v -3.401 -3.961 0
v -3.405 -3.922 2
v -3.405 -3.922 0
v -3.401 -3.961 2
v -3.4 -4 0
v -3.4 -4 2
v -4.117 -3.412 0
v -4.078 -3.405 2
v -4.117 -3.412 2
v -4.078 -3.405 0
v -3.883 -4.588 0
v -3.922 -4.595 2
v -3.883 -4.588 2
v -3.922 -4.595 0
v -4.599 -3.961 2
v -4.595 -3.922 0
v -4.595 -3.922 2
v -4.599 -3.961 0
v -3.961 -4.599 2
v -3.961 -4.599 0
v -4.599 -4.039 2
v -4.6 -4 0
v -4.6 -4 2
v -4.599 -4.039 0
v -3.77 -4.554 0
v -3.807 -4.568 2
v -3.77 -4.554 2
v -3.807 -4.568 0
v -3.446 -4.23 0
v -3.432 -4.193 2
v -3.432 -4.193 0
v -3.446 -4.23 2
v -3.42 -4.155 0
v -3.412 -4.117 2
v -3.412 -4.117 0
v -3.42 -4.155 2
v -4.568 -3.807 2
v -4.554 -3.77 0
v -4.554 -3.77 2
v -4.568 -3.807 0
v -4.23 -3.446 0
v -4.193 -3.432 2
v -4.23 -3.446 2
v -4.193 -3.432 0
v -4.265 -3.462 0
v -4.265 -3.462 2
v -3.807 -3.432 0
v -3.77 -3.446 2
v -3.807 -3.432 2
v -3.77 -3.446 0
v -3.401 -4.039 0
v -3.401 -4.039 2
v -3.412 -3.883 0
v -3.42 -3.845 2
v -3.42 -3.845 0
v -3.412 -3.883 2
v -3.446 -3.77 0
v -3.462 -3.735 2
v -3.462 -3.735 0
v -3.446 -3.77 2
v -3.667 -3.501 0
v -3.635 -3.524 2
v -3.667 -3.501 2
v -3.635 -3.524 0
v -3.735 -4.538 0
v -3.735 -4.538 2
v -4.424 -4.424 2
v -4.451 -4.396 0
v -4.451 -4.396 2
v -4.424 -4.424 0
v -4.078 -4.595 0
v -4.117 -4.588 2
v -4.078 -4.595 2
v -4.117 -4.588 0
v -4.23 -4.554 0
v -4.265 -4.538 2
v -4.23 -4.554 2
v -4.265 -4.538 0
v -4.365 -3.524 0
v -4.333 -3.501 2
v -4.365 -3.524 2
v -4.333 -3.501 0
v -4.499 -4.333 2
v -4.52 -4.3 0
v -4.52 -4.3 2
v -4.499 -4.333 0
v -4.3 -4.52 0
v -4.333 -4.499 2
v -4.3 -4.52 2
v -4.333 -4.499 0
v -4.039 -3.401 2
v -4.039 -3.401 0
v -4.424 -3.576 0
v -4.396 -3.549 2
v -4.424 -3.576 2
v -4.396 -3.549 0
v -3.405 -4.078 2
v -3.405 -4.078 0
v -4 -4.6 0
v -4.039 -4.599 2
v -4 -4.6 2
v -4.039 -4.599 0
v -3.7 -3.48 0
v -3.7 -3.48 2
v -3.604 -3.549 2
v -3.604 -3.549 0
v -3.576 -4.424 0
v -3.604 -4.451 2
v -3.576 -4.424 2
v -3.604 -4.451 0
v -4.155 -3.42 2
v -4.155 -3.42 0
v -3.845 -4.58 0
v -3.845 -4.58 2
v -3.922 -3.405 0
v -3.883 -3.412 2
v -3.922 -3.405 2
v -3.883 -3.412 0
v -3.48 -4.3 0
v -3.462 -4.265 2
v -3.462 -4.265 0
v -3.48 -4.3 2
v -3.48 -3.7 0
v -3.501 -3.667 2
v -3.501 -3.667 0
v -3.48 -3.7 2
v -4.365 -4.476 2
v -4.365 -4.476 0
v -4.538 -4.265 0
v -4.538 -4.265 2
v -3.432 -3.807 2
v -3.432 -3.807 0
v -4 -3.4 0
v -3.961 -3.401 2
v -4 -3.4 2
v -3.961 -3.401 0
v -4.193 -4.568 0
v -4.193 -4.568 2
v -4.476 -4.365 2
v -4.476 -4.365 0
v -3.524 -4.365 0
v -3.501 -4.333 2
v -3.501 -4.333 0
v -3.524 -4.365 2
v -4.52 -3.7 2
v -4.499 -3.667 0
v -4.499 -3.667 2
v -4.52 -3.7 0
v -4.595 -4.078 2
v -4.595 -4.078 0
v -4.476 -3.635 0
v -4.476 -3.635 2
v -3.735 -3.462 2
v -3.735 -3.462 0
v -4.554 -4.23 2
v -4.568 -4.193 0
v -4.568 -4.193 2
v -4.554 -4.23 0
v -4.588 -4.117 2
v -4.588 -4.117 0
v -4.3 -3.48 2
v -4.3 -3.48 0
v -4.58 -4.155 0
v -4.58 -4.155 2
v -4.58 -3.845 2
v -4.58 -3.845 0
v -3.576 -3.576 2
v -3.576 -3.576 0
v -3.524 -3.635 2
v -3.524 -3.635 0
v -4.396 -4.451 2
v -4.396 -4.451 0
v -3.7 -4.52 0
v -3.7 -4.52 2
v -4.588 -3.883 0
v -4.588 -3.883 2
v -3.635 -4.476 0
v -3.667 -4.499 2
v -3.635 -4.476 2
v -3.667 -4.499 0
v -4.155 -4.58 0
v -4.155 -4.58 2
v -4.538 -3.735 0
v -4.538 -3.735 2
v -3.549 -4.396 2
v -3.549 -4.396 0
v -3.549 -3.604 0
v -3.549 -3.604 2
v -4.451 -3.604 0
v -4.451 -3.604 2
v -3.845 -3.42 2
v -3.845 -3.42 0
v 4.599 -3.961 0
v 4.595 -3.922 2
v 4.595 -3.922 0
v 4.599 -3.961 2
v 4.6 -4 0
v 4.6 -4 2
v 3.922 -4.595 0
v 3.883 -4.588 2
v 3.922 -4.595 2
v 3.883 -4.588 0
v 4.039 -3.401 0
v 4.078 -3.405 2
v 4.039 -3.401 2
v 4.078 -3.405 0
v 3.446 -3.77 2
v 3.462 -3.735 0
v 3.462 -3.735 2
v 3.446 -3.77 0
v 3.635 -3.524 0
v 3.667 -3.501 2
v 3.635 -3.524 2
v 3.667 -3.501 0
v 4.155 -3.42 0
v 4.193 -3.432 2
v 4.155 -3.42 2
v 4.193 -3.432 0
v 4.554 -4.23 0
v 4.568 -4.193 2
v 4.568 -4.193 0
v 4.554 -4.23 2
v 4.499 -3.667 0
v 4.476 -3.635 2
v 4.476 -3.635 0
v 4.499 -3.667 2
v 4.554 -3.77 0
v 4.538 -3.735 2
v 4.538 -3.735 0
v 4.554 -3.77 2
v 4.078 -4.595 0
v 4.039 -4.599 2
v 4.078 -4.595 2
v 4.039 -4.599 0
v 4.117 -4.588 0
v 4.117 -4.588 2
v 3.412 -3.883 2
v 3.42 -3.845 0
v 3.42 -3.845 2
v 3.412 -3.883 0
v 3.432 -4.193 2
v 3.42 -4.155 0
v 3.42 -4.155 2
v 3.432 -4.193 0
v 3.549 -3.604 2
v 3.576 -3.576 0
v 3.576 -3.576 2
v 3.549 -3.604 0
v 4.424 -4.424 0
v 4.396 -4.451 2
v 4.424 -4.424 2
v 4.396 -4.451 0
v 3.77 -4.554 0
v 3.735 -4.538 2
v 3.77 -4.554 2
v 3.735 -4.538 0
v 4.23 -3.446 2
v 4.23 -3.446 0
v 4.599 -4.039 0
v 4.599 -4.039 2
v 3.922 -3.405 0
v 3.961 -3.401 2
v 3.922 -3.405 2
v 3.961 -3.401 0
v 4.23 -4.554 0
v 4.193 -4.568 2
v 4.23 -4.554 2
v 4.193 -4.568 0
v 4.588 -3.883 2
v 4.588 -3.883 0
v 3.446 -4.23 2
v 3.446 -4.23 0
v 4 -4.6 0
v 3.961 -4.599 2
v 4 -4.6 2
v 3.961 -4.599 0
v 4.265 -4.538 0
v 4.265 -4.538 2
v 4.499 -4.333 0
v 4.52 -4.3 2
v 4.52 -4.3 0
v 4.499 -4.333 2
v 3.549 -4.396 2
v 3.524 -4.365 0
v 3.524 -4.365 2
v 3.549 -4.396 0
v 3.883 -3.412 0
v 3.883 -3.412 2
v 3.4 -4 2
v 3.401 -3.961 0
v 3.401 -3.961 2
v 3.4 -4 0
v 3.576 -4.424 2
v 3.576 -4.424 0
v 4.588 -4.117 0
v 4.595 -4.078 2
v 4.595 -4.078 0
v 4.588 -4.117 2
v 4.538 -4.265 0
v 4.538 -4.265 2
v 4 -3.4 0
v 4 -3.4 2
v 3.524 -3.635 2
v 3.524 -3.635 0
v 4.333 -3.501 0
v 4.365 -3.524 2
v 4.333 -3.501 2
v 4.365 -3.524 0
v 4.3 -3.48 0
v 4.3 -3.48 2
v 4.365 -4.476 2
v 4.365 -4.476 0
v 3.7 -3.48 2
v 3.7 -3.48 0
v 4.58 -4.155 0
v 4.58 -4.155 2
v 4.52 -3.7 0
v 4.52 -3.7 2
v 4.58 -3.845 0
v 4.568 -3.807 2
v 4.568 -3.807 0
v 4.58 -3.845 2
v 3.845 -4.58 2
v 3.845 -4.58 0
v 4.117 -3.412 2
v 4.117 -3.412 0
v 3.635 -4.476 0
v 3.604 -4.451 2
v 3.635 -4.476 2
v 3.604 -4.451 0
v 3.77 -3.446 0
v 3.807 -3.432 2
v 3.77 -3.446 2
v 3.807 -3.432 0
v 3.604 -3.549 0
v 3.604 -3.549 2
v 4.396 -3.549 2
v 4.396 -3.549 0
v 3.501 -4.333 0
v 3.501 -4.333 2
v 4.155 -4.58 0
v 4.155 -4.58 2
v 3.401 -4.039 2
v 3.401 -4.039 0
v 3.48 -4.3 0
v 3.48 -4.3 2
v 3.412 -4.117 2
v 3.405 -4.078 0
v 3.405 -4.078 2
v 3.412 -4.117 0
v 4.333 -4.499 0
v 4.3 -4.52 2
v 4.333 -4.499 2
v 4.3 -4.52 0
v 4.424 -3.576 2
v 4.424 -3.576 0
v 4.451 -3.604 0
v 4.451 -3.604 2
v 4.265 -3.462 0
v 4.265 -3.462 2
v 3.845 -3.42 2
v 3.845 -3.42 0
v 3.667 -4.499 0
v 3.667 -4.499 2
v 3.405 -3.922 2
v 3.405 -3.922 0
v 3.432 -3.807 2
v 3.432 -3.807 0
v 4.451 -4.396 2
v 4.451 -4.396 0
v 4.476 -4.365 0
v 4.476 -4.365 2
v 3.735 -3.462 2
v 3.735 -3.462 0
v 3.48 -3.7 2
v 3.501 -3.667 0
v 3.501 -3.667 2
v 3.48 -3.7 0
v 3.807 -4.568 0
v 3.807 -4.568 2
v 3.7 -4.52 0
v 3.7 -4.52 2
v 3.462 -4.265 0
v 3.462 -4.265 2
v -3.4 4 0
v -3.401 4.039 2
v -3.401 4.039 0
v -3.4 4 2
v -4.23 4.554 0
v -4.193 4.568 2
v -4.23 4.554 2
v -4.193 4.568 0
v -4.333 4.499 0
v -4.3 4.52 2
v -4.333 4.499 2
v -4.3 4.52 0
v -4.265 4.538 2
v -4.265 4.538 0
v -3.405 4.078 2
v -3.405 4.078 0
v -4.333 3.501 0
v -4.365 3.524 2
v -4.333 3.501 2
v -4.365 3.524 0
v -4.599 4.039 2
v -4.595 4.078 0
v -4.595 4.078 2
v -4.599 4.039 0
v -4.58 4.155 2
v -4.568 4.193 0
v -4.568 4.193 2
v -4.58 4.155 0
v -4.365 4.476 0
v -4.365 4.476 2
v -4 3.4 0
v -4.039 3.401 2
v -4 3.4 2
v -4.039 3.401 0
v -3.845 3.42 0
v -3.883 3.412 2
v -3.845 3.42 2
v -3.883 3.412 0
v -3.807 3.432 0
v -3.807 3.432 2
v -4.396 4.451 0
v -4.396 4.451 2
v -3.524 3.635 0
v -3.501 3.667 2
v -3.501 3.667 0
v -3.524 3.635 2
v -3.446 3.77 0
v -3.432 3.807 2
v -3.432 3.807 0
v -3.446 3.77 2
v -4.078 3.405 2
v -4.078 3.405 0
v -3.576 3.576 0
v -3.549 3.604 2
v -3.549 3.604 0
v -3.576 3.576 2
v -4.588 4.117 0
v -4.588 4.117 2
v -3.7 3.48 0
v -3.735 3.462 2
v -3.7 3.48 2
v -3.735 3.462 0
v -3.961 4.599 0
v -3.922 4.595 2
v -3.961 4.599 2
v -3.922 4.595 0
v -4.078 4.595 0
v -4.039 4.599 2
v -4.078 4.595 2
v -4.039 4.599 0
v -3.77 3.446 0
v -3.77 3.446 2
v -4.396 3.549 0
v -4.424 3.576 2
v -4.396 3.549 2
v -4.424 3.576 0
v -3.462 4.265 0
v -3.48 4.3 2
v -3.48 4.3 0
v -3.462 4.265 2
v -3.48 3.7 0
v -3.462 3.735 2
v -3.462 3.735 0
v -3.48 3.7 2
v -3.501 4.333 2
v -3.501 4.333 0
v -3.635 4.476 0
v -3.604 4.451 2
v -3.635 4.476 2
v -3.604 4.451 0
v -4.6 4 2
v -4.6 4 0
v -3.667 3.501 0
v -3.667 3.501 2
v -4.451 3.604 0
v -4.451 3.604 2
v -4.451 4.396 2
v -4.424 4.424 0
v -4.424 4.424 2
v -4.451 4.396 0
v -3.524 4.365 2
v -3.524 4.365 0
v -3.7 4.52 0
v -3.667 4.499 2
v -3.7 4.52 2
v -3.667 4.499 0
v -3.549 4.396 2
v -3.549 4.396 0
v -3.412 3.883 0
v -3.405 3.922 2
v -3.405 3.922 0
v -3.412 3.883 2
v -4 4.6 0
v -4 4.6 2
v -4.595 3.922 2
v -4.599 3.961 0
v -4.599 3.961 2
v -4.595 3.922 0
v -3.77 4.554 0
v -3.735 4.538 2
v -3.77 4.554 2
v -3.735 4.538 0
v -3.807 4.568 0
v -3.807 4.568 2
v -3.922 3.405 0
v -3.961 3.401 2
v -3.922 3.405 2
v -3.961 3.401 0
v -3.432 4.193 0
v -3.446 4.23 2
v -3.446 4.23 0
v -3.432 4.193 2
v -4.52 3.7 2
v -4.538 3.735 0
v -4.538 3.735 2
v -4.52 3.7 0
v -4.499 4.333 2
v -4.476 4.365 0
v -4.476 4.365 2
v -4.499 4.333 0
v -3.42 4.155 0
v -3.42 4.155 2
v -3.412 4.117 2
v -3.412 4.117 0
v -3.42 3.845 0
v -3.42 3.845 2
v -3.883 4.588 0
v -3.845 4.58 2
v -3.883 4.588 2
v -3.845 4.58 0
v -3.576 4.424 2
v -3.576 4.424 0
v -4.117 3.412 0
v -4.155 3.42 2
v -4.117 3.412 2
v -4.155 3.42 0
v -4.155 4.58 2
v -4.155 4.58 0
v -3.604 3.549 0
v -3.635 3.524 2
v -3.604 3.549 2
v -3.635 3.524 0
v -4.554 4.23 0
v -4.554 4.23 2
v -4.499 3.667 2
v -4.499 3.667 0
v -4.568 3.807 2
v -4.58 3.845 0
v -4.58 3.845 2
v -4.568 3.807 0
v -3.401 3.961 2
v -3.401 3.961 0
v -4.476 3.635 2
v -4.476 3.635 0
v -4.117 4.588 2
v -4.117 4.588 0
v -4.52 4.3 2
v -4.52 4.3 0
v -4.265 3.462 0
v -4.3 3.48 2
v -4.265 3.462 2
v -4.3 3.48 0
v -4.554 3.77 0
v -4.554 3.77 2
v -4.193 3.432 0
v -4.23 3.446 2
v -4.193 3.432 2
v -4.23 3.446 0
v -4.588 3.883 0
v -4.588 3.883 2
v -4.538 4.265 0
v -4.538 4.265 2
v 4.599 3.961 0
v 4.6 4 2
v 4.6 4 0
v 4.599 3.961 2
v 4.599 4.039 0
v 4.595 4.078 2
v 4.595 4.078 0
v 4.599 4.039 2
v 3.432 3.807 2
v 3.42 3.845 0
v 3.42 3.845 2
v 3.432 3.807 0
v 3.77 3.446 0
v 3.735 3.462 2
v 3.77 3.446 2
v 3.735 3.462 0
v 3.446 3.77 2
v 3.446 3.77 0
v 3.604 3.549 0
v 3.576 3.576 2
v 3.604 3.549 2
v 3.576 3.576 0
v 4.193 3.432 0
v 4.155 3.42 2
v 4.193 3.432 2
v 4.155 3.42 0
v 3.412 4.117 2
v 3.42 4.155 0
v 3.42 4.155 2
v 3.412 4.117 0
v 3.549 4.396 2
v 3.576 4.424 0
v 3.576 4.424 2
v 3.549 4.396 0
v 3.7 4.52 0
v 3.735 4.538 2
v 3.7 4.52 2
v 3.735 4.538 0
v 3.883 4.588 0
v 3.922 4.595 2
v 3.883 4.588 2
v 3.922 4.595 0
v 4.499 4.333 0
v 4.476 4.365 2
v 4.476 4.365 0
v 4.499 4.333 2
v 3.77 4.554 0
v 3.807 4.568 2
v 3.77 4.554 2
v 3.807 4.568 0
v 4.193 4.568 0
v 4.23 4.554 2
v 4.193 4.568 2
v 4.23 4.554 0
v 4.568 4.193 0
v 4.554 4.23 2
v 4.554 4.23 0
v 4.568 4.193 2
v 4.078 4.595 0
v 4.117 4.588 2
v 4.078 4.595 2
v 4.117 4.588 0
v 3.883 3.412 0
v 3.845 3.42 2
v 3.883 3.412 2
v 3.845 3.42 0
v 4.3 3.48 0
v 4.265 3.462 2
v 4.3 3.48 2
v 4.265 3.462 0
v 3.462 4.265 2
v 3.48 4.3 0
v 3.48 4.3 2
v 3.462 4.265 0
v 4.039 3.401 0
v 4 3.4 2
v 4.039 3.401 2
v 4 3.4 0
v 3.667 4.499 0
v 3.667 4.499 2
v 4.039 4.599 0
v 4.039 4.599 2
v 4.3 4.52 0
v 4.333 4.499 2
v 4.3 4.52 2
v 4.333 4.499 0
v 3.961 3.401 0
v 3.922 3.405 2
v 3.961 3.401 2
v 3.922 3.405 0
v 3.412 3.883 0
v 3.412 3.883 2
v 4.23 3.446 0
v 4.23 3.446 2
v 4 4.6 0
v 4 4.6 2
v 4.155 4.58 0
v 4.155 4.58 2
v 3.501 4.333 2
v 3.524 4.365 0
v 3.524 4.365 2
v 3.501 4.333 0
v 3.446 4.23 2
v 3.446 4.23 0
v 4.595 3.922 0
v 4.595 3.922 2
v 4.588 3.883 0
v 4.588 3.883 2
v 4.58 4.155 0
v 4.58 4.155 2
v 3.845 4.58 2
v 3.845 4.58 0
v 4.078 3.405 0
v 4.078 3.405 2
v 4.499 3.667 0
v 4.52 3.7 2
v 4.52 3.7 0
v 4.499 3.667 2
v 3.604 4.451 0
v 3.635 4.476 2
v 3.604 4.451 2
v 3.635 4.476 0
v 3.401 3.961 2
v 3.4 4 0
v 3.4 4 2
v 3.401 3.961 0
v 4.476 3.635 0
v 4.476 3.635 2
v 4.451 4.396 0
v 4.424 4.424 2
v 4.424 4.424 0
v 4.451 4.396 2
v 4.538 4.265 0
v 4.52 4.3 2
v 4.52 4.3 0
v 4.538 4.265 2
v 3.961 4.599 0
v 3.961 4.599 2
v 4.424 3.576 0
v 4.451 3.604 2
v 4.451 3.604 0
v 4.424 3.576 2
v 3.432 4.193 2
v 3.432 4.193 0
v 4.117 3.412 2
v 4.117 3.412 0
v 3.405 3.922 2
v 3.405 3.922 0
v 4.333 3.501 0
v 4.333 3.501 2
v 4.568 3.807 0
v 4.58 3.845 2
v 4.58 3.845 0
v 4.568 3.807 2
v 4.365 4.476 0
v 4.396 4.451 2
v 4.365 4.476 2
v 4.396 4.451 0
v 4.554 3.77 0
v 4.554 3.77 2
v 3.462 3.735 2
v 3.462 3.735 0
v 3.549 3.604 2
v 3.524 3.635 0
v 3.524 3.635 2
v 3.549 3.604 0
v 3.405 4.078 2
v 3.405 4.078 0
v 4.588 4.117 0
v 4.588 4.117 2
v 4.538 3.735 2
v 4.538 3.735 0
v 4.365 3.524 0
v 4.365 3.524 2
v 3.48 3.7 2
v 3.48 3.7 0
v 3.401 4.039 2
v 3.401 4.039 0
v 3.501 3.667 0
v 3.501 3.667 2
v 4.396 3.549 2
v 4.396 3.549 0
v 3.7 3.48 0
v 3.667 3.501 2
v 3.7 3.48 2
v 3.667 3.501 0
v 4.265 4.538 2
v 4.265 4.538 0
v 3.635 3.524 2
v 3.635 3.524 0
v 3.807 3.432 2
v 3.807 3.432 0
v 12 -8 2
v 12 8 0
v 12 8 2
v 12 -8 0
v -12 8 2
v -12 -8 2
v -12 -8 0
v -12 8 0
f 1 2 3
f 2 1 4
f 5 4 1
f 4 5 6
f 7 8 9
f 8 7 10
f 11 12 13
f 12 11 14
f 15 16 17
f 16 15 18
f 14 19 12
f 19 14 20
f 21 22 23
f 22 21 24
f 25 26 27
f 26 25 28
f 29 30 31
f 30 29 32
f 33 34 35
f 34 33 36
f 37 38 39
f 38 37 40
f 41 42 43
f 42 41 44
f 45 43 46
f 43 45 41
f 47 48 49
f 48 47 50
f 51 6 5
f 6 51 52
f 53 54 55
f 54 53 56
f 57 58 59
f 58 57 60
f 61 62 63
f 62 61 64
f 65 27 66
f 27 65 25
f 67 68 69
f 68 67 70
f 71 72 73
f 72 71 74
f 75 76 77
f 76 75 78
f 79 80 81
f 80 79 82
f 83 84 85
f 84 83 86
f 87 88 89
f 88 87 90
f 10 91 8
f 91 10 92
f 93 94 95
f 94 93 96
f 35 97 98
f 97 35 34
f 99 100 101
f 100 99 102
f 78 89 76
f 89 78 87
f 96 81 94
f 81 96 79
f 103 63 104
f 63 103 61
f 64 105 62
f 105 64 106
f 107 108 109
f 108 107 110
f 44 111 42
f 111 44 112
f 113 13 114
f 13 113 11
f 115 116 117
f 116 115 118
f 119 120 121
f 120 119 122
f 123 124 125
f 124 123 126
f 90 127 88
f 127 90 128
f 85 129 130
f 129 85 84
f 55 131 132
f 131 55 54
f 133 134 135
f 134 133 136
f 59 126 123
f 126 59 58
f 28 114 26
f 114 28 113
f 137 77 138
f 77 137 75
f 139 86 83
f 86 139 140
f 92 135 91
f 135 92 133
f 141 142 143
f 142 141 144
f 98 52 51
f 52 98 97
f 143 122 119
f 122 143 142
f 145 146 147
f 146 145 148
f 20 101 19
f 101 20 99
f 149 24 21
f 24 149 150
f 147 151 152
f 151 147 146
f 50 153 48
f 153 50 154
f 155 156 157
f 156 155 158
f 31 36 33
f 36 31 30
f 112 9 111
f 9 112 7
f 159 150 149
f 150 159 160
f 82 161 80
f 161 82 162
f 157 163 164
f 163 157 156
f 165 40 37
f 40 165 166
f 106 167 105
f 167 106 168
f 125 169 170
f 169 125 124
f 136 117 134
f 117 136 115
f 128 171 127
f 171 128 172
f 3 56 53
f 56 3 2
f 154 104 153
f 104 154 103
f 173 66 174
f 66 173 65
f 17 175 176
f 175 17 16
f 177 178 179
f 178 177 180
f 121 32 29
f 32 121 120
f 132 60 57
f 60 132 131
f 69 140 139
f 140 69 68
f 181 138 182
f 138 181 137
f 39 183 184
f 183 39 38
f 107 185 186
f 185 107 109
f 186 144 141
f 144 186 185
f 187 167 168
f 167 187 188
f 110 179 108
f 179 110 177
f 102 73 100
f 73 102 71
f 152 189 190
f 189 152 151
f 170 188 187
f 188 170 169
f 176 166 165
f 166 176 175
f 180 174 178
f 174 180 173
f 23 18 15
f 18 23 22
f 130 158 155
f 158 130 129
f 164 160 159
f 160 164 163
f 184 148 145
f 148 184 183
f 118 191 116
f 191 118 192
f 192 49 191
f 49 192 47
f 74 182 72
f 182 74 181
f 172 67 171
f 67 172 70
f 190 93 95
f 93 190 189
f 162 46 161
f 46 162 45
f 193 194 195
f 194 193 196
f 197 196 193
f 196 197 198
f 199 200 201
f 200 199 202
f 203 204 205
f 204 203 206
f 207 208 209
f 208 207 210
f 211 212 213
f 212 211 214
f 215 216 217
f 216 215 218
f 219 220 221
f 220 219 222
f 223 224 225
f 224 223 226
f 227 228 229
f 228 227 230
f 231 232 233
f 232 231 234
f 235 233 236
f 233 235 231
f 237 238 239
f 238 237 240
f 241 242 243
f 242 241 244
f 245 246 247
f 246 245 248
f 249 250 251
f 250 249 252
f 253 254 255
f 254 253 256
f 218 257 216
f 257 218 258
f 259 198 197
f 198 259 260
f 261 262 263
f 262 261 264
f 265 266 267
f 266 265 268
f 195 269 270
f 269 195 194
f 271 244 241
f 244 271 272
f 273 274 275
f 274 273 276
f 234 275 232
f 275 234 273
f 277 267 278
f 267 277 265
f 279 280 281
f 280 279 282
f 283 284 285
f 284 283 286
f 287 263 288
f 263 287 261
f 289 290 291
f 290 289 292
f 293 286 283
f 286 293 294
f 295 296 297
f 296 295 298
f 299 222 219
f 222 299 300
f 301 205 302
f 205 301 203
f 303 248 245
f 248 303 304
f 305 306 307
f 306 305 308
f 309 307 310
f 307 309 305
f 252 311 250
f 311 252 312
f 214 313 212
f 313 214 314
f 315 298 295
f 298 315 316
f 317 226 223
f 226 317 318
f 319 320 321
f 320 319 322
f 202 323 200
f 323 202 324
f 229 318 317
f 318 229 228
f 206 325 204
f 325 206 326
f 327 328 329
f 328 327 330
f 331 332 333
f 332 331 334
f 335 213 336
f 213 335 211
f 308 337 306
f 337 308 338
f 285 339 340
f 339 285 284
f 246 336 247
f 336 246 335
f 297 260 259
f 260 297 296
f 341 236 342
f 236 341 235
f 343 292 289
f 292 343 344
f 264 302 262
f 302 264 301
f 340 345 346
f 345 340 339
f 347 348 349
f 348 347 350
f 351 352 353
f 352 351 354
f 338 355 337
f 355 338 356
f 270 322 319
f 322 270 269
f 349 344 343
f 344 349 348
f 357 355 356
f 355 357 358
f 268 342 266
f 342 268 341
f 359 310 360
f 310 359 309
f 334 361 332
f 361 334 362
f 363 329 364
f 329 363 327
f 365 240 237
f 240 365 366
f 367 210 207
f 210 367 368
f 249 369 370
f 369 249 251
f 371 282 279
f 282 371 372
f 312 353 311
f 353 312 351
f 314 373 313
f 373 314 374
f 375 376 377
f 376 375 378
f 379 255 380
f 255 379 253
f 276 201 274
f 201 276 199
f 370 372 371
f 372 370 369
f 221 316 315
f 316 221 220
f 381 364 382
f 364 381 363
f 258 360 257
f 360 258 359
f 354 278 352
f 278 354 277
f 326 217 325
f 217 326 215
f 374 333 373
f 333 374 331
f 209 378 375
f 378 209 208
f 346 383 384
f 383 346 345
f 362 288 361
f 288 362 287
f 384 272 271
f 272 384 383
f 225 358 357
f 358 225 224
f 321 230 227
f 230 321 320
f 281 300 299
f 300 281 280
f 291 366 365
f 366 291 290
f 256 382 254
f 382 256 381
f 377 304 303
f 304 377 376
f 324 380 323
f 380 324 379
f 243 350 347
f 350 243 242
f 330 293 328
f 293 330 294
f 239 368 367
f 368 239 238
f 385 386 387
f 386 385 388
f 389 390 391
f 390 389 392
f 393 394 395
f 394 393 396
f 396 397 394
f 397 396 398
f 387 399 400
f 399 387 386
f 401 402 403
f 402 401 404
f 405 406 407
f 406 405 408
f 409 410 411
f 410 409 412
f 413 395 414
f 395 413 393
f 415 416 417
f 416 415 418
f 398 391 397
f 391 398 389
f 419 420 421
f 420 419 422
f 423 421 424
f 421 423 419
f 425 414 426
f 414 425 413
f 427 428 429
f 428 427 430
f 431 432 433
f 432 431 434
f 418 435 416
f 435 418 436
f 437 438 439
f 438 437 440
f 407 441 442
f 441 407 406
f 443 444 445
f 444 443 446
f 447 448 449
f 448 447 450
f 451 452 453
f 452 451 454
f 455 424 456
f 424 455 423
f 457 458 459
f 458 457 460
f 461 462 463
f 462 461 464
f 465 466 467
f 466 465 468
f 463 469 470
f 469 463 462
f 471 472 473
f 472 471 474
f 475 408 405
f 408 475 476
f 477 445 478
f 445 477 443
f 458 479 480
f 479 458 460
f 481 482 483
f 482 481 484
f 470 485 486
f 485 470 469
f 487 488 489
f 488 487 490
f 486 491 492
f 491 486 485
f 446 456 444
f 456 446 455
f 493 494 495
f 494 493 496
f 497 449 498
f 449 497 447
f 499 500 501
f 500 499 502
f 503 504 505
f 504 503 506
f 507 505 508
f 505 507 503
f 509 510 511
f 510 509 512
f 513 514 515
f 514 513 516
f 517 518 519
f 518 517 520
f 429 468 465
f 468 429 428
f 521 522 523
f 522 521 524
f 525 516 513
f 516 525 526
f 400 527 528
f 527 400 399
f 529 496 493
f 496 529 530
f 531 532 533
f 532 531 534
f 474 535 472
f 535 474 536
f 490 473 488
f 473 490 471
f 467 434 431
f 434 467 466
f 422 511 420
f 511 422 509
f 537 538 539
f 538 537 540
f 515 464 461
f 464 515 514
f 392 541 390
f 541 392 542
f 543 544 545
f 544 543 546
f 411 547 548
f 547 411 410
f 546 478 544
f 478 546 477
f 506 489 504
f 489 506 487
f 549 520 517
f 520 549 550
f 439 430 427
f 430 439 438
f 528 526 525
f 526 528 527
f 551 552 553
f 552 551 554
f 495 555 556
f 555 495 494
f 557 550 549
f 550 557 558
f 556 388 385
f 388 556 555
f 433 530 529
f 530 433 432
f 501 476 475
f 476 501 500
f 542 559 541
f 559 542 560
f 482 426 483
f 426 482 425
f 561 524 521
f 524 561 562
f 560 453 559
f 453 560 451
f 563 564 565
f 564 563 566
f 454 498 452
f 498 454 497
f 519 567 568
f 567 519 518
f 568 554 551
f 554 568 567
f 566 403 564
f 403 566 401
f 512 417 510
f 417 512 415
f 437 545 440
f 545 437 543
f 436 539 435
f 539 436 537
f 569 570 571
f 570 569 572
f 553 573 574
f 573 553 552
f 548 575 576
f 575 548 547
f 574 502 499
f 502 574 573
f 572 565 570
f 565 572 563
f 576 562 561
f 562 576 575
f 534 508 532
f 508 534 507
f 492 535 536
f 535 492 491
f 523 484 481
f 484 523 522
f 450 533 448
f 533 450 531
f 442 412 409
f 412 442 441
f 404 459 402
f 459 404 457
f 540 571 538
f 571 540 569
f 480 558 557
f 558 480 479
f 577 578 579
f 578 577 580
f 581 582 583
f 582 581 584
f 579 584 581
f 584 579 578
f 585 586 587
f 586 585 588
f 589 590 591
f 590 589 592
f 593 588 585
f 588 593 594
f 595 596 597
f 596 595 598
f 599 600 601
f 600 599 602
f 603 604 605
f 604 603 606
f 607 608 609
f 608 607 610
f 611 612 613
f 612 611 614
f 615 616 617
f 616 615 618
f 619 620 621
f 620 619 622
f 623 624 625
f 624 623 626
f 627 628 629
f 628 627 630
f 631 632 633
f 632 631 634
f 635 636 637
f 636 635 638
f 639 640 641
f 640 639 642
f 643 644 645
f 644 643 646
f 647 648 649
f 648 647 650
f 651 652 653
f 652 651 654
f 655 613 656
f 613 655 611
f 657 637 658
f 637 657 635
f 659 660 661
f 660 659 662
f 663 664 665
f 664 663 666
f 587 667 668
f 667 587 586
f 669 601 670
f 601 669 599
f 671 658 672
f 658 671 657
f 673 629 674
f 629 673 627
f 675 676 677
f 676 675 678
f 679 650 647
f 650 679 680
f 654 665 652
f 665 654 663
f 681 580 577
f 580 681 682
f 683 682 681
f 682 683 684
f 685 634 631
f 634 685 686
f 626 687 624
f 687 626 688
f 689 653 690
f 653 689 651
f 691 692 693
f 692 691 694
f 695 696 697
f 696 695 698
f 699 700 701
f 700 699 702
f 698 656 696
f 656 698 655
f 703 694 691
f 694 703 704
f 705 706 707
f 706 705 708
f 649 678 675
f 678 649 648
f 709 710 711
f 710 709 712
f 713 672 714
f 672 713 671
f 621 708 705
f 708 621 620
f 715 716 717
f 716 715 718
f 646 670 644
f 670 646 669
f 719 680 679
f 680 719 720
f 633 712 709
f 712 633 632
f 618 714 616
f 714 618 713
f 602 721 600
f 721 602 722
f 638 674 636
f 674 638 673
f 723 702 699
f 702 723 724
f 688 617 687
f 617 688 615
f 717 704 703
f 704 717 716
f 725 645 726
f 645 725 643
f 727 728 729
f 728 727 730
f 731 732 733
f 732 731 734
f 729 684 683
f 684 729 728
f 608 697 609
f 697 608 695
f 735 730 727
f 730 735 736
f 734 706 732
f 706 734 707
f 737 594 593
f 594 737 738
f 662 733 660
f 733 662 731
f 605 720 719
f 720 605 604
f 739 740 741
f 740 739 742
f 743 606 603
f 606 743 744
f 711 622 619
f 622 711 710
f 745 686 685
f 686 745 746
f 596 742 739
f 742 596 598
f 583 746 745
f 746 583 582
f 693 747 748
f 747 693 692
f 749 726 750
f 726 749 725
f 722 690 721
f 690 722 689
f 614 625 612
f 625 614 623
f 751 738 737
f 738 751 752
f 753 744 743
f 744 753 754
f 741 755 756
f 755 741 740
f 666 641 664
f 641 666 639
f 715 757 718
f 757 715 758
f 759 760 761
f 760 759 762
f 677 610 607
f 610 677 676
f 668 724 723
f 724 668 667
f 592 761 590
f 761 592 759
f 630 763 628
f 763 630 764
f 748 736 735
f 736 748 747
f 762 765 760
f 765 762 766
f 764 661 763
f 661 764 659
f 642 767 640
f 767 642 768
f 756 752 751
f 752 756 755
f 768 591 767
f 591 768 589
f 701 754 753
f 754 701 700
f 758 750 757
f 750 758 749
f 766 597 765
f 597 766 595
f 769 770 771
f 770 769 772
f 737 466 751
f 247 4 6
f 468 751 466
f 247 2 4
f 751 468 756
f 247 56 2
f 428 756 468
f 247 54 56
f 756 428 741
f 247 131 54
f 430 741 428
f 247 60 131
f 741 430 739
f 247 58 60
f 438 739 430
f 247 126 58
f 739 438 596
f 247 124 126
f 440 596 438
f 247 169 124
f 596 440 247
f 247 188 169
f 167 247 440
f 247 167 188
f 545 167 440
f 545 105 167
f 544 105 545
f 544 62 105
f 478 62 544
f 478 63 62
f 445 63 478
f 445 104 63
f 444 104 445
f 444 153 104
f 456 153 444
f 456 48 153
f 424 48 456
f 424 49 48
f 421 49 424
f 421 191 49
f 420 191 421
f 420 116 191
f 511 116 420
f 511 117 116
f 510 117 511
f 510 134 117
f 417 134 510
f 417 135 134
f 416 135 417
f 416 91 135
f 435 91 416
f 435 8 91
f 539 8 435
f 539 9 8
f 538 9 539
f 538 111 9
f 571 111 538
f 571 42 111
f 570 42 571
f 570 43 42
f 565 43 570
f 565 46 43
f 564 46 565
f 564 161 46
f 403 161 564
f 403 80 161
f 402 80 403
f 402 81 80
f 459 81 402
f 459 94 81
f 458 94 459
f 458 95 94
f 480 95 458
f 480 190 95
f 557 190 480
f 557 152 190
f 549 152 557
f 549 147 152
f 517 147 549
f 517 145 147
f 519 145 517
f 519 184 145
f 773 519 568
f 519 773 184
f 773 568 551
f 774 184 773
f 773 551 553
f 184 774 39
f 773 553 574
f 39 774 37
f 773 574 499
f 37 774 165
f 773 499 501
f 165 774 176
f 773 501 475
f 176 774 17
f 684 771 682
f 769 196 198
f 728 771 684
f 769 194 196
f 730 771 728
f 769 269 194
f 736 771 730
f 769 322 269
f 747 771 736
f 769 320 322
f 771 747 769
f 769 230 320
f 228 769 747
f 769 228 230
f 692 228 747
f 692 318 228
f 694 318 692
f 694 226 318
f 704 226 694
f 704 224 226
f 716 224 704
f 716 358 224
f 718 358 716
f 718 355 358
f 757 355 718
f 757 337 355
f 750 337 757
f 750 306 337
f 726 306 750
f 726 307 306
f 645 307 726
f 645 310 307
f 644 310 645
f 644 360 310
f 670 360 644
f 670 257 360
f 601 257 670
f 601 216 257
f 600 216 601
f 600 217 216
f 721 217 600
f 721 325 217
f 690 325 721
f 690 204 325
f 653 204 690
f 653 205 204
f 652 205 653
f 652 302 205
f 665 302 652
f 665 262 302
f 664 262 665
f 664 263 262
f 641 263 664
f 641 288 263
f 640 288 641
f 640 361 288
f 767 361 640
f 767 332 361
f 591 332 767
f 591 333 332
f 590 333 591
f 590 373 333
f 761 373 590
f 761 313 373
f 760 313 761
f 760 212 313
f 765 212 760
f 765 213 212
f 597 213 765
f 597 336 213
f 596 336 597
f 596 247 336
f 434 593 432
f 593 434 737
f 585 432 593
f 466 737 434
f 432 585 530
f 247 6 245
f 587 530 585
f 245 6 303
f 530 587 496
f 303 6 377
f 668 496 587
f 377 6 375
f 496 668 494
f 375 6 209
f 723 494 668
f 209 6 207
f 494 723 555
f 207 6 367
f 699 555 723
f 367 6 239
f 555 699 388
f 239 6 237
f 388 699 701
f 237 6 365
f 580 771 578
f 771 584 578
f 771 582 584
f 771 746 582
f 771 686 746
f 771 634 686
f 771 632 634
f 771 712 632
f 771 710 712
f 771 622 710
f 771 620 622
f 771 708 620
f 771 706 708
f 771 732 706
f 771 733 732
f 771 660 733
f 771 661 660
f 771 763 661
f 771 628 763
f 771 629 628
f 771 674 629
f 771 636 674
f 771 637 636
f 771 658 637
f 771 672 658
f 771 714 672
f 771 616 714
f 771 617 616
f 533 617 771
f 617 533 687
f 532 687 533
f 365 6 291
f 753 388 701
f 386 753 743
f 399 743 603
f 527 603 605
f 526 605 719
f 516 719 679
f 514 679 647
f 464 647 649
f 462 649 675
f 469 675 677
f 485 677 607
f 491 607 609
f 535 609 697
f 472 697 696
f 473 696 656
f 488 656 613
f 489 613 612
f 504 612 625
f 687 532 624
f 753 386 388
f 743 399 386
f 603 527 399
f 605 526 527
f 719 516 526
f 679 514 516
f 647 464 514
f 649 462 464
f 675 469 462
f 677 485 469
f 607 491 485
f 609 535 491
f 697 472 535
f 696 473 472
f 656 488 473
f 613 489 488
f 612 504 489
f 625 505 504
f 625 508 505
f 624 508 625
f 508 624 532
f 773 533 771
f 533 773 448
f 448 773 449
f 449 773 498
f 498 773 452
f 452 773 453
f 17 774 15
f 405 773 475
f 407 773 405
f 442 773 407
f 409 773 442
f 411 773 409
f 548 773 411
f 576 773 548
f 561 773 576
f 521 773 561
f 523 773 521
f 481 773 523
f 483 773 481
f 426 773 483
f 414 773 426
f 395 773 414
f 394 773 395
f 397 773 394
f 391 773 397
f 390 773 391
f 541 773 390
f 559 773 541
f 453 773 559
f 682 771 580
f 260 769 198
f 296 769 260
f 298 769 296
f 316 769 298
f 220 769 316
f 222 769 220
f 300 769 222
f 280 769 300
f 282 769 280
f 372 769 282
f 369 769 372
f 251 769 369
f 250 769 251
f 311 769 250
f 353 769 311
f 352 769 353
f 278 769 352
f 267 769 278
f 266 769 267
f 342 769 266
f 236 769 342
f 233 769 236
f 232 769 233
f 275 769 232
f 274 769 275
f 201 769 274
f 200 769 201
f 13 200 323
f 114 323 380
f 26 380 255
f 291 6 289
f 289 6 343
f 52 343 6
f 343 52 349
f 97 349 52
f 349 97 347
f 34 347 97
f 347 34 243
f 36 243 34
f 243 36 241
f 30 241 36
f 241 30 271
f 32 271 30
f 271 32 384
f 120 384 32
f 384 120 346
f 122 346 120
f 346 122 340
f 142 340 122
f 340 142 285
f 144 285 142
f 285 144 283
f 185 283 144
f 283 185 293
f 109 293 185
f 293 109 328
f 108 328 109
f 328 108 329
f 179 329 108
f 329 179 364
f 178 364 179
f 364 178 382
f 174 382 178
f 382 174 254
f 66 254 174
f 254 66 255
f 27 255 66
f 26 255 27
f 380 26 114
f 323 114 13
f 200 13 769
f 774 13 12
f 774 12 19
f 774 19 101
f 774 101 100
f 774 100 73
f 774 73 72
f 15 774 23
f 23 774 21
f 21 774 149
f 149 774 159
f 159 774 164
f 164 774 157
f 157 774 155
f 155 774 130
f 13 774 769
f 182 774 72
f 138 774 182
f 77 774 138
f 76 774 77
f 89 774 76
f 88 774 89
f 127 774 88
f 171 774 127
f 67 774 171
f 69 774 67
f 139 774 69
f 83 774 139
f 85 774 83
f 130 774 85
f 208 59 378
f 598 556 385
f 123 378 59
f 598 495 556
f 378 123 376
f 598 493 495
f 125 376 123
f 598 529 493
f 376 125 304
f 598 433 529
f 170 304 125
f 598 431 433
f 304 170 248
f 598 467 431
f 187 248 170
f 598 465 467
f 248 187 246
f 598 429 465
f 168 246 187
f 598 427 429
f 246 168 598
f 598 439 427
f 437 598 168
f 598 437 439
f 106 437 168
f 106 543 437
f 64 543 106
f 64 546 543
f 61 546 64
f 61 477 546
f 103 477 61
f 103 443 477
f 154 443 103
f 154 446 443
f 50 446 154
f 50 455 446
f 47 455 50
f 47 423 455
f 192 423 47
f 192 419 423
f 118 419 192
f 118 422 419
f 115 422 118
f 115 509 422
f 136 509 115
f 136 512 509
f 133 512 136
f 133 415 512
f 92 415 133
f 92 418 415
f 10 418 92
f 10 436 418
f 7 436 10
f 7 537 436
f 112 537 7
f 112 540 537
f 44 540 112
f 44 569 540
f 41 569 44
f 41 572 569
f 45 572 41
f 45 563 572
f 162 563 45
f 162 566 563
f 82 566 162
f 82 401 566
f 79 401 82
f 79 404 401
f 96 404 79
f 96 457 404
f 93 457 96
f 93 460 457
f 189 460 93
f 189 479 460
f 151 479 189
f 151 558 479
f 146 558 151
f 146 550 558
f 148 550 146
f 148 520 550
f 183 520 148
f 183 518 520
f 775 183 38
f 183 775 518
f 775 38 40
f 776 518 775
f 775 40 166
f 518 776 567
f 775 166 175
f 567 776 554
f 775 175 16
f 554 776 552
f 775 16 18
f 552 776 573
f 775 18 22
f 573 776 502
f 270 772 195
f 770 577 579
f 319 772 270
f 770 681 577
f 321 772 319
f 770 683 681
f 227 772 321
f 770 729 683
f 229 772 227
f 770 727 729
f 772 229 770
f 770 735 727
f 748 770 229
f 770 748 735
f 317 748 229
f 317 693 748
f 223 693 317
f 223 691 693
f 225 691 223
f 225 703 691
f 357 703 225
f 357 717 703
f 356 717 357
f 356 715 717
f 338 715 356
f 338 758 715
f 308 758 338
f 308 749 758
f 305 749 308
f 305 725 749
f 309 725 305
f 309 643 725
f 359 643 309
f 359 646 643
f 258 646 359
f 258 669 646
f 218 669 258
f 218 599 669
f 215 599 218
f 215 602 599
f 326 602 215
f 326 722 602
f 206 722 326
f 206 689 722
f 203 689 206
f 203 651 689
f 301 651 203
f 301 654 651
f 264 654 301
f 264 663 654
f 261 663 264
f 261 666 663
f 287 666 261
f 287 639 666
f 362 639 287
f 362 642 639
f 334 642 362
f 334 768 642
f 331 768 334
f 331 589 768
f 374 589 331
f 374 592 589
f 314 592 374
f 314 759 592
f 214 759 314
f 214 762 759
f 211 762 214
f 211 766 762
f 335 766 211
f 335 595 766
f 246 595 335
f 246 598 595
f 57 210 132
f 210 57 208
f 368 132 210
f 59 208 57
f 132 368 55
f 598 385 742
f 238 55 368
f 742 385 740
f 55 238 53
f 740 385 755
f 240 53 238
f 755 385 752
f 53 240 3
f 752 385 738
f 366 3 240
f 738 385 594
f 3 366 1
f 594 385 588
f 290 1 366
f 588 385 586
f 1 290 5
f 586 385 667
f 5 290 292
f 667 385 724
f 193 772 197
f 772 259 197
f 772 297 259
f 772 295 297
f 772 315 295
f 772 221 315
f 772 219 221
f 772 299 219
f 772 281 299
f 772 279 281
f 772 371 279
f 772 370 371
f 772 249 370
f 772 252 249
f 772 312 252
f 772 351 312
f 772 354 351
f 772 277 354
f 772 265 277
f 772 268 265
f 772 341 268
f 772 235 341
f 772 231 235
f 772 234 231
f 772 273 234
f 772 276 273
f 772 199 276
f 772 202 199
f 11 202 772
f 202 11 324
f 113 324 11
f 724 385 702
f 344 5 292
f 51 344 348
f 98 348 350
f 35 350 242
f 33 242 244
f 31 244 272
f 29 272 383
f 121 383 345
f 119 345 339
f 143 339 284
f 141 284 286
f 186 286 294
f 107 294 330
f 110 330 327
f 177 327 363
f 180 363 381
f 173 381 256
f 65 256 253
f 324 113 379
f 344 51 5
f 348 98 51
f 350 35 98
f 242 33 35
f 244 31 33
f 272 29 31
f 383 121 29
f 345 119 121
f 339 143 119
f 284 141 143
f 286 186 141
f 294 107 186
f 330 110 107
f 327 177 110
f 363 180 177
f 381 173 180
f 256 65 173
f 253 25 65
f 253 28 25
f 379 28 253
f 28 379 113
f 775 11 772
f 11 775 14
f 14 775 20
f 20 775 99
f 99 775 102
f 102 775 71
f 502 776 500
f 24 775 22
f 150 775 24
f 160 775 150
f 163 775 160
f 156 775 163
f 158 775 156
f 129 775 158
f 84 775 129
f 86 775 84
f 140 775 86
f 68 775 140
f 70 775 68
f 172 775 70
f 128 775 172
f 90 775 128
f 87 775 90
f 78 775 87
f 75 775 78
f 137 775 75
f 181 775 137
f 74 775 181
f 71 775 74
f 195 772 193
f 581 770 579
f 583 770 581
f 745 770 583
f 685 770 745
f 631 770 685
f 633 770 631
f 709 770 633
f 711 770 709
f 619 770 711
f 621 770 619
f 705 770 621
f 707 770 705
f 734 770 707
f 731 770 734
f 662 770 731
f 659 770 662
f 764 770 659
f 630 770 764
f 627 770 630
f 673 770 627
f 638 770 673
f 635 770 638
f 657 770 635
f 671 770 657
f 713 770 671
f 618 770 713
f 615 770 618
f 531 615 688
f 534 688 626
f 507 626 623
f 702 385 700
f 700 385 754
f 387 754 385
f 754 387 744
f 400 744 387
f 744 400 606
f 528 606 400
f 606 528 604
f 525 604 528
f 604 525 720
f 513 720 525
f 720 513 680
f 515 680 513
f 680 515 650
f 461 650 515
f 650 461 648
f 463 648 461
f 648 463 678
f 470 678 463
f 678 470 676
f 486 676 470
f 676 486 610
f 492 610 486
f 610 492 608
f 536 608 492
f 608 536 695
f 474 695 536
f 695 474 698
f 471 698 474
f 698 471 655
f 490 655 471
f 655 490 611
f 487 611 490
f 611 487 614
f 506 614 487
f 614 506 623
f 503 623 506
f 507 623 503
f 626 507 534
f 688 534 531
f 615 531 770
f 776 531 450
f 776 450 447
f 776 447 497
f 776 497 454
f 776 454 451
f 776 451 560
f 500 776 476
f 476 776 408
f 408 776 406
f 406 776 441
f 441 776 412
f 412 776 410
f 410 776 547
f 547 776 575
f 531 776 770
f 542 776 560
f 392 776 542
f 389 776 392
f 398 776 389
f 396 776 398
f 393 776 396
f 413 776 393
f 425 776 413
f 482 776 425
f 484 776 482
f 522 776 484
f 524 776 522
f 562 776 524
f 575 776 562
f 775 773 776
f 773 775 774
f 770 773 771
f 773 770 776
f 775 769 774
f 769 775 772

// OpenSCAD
// Auto-generated from tests/data/feature_fixtures_manifest.json
// fixture: plate_small_hole_grid
// fixture_type: plate
// description: Small-diameter hole grid to exercise detector scale tolerance.
$fn = 96;

plate_size = [24.000000, 16.000000, 2.000000];
plate_origin = [-12.000000, -8.000000, 0.000000];

module through_hole(center, diameter, height) {
  translate(center) cylinder(d=diameter, h=height, center=false);
}

module through_slot(start, end, width, height) {
  hull() {
    through_hole(start, width, height);
    through_hole(end, width, height);
  }
}

module counterbore_hole(center, through_d, bore_d, bore_depth, plate_thickness) {
  translate([center[0], center[1], -0.1])
    cylinder(d=through_d, h=plate_thickness + 0.2, center=false);
  translate([center[0], center[1], plate_thickness - bore_depth])
    cylinder(d=bore_d, h=bore_depth + 0.1, center=false);
}

difference() {
  translate(plate_origin) cube(plate_size);
  for (row = [0 : 1]) {
    for (col = [0 : 1]) {
      through_hole([-4.000000, -4.000000, -0.100000] + row * [0.000000, 8.000000, 0.000000] + col * [8.000000, 0.000000, 0.000000], 1.200000, 2.200000);  // grid_pattern_0
    }
  }
}
